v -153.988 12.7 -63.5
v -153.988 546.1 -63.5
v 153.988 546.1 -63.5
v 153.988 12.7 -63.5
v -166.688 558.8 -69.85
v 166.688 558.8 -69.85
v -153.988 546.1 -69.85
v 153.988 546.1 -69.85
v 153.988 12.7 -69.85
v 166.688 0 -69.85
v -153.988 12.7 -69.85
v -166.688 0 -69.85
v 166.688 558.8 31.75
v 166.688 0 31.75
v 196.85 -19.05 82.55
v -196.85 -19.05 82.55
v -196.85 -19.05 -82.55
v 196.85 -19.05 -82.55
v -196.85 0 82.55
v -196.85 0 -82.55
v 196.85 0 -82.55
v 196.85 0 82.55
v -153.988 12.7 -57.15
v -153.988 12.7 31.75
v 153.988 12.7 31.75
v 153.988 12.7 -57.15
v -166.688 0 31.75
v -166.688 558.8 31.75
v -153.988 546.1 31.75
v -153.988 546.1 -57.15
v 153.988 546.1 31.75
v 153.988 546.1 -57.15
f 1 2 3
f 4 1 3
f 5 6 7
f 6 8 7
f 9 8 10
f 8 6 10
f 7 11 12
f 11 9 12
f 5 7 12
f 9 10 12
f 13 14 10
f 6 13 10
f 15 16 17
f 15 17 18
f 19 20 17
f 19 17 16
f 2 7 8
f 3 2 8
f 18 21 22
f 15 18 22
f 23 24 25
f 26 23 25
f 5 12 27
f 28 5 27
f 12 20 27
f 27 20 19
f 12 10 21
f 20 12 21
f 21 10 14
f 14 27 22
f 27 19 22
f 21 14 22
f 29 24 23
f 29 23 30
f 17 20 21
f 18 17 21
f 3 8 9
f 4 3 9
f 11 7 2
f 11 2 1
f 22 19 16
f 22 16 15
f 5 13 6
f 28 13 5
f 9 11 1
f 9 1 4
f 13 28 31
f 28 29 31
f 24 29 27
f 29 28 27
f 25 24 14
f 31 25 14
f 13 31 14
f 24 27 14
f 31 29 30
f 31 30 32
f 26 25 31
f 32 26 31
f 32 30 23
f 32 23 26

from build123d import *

# Parameters (mm, degrees)
F0_W     = 393.7
F0_H     = 165.1
F1_DEPTH = 19.05
F3_DEPTH = 558.8
F4_W     = 307.975
F4_H     = 533.4
F5_DEPTH = 88.9
F6_W     = 307.975
F6_H     = 533.4
F7_DEPTH = 6.35


with BuildPart() as f1:
    # F0 (on Front) → F1 (new body)
    with BuildSketch(Plane.XZ):
        Rectangle(F0_W, F0_H)
    extrude(amount=F1_DEPTH)

    # F2 (on face) → F3 (join)
    with BuildSketch(Plane(origin=(0, 0, 0), x_dir=(-1, 0, 0), z_dir=(0, 1, 0))):
        Polygon((-166.6875, -69.85), (0, -69.85), (166.6875, -69.85), (166.6875, 31.75), (-166.6875, 31.75), align=None)
    extrude(amount=F3_DEPTH)

    # F4 (on face) → F5 (cut)
    with BuildSketch(Plane.XY.offset(31.75)):
        with Locations((0, 279.4)):
            Rectangle(F4_W, F4_H)
    extrude(amount=-F5_DEPTH, mode=Mode.SUBTRACT)

    # F6 (on face) → F7 (cut)
    with BuildSketch(Plane(origin=(0, 0, -69.85), x_dir=(1, 0, 0), z_dir=(0, 0, -1))):
        with Locations((0, -279.4)):
            Rectangle(F6_W, F6_H)
    extrude(amount=-F7_DEPTH, mode=Mode.SUBTRACT)


solid = f1.part
